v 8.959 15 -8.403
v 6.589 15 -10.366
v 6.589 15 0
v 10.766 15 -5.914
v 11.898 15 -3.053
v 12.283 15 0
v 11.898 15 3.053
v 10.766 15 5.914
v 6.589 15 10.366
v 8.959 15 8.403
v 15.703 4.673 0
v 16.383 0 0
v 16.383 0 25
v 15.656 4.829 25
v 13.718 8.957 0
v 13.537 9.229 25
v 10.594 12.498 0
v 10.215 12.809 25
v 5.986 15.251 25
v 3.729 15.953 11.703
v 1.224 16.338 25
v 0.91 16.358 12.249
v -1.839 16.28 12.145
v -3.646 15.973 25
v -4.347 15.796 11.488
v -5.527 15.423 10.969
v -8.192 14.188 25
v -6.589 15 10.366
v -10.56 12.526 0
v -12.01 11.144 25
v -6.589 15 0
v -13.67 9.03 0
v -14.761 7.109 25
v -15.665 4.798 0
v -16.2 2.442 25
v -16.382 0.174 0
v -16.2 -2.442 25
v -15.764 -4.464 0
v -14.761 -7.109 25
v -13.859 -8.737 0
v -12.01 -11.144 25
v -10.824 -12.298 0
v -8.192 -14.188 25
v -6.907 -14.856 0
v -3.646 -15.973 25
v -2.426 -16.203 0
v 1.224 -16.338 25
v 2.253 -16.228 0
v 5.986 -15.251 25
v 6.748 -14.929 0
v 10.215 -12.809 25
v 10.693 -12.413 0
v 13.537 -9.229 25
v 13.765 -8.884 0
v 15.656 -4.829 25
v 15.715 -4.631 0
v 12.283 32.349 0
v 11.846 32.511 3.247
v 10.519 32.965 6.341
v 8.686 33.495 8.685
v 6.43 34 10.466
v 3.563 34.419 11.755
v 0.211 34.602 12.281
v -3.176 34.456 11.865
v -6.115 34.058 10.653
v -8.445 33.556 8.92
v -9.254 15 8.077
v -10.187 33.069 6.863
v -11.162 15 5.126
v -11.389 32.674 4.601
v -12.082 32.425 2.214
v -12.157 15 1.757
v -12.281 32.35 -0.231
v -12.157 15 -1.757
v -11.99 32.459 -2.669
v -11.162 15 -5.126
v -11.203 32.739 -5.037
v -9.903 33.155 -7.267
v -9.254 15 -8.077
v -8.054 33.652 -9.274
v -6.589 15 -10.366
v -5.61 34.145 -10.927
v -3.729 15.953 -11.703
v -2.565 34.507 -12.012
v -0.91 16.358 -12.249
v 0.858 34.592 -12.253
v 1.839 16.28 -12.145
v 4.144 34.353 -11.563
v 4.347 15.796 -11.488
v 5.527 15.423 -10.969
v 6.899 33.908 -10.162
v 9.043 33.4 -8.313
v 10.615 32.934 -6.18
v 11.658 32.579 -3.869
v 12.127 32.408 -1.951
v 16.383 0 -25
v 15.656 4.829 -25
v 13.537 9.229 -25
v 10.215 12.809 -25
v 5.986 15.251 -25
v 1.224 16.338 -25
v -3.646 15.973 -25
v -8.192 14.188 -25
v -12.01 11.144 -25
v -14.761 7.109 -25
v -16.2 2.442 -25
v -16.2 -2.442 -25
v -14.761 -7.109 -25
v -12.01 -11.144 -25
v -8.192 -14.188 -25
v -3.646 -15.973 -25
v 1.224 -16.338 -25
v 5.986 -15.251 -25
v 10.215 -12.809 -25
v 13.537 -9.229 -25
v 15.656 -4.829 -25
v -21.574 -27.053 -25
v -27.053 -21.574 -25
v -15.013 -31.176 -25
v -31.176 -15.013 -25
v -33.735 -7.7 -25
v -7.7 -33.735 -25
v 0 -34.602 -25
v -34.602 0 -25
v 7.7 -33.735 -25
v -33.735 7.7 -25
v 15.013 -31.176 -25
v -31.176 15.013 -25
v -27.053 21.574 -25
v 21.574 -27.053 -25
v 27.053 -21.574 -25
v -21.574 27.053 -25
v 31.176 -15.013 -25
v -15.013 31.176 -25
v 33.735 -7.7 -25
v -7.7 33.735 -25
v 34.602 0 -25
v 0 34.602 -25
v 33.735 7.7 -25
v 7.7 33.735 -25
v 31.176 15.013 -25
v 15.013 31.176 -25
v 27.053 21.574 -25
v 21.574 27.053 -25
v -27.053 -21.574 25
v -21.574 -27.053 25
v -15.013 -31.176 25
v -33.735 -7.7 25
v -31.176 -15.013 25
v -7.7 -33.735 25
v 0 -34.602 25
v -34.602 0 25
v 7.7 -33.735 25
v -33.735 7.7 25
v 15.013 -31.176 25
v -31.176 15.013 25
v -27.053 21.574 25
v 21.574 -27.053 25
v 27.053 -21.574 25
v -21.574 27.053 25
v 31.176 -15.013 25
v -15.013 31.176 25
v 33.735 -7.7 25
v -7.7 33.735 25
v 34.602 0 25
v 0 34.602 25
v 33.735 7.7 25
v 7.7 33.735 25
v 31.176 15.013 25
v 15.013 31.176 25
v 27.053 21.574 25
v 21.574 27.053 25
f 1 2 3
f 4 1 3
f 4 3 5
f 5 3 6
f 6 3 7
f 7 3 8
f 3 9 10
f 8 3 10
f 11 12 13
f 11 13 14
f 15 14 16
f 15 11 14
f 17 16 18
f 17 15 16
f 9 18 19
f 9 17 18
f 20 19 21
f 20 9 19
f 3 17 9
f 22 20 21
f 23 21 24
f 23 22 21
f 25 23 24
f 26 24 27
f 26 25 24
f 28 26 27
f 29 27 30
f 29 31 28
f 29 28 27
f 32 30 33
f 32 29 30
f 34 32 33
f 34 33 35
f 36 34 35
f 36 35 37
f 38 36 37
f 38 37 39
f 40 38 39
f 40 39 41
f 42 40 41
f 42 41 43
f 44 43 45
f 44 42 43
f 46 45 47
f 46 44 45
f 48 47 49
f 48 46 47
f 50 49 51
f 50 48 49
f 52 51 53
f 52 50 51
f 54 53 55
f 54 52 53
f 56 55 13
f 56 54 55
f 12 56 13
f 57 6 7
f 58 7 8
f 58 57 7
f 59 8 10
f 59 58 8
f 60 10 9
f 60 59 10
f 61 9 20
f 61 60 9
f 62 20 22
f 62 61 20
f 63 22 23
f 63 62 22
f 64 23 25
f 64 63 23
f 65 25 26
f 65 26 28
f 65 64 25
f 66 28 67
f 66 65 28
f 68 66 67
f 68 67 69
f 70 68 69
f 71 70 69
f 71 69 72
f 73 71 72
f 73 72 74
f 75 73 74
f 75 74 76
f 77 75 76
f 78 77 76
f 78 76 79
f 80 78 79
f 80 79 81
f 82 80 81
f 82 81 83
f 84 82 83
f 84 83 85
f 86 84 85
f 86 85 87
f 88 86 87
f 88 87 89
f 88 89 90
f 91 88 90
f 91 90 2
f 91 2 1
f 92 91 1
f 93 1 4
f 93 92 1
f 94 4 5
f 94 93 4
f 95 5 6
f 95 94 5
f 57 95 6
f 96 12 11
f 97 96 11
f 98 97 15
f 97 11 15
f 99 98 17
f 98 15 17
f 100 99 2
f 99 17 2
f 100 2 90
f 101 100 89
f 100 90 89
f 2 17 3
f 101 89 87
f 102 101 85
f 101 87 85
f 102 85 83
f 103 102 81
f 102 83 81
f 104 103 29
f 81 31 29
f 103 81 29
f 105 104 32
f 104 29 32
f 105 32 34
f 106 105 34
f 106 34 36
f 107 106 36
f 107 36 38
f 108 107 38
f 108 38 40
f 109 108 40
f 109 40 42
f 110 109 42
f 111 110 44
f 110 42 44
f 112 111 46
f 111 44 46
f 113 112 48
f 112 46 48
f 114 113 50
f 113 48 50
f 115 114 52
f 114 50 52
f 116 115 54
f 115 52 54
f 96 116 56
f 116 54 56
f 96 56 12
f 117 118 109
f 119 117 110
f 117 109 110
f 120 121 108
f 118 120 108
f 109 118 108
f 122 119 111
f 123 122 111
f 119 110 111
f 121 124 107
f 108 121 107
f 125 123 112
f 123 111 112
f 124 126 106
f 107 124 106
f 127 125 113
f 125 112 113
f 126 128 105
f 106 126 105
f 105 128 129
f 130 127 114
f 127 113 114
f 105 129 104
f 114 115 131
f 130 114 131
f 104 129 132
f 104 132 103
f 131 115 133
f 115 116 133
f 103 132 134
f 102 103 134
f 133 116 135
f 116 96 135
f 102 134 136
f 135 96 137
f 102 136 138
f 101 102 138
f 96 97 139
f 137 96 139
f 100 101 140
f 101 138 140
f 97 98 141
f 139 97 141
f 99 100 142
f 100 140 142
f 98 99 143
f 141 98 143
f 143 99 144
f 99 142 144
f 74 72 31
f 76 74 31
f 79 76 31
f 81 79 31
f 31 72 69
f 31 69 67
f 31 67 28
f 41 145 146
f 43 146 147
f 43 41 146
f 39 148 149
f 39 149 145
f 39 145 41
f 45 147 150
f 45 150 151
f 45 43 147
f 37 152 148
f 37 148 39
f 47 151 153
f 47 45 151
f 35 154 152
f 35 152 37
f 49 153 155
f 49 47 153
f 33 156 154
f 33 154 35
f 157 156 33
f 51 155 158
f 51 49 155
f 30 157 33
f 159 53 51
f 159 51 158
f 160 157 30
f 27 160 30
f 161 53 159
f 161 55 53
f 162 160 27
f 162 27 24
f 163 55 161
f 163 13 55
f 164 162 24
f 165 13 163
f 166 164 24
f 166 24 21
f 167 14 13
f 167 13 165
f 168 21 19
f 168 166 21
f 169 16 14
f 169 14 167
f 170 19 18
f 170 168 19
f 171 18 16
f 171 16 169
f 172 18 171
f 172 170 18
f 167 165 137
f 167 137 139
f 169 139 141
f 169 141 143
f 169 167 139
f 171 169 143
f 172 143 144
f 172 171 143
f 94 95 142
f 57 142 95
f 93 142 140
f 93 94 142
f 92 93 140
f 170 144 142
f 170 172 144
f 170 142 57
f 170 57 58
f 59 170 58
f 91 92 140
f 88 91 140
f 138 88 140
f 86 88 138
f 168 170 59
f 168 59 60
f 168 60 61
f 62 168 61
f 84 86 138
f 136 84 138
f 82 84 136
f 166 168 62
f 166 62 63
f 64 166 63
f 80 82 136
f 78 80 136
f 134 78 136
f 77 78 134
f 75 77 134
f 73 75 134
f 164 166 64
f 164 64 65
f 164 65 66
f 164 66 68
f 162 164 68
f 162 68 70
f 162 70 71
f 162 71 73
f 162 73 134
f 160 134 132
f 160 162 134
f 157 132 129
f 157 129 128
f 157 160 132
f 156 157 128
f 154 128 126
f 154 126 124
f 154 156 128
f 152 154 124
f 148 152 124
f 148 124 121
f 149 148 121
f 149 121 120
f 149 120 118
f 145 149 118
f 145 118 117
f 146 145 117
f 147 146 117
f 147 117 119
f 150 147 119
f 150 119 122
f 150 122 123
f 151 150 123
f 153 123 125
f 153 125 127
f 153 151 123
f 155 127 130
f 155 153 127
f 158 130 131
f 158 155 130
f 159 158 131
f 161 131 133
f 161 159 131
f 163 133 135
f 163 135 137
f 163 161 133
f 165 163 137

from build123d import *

# Parameters (mm, degrees)
F0_R          = 34.602453
F0_R_2        = 16.383423
F1_DEPTH      = 25
F1_DEPTH_BACK = 25
F3_R          = 12.283084
F4_DEPTH      = 25


with BuildPart() as f1:
    # F0 (on Top) → F1 (new body, two sides)
    with BuildSketch(Plane.XY) as f1_sk:
        Circle(F0_R)
        Circle(F0_R_2, mode=Mode.SUBTRACT)
    extrude(amount=F1_DEPTH)
    extrude(f1_sk.sketch, amount=-F1_DEPTH_BACK)

    # F3 (on offset) → F4 (cut)
    with BuildSketch(Plane.XZ.offset(-40)):
        Circle(F3_R)
    extrude(amount=F4_DEPTH, mode=Mode.SUBTRACT)


solid = f1.part
